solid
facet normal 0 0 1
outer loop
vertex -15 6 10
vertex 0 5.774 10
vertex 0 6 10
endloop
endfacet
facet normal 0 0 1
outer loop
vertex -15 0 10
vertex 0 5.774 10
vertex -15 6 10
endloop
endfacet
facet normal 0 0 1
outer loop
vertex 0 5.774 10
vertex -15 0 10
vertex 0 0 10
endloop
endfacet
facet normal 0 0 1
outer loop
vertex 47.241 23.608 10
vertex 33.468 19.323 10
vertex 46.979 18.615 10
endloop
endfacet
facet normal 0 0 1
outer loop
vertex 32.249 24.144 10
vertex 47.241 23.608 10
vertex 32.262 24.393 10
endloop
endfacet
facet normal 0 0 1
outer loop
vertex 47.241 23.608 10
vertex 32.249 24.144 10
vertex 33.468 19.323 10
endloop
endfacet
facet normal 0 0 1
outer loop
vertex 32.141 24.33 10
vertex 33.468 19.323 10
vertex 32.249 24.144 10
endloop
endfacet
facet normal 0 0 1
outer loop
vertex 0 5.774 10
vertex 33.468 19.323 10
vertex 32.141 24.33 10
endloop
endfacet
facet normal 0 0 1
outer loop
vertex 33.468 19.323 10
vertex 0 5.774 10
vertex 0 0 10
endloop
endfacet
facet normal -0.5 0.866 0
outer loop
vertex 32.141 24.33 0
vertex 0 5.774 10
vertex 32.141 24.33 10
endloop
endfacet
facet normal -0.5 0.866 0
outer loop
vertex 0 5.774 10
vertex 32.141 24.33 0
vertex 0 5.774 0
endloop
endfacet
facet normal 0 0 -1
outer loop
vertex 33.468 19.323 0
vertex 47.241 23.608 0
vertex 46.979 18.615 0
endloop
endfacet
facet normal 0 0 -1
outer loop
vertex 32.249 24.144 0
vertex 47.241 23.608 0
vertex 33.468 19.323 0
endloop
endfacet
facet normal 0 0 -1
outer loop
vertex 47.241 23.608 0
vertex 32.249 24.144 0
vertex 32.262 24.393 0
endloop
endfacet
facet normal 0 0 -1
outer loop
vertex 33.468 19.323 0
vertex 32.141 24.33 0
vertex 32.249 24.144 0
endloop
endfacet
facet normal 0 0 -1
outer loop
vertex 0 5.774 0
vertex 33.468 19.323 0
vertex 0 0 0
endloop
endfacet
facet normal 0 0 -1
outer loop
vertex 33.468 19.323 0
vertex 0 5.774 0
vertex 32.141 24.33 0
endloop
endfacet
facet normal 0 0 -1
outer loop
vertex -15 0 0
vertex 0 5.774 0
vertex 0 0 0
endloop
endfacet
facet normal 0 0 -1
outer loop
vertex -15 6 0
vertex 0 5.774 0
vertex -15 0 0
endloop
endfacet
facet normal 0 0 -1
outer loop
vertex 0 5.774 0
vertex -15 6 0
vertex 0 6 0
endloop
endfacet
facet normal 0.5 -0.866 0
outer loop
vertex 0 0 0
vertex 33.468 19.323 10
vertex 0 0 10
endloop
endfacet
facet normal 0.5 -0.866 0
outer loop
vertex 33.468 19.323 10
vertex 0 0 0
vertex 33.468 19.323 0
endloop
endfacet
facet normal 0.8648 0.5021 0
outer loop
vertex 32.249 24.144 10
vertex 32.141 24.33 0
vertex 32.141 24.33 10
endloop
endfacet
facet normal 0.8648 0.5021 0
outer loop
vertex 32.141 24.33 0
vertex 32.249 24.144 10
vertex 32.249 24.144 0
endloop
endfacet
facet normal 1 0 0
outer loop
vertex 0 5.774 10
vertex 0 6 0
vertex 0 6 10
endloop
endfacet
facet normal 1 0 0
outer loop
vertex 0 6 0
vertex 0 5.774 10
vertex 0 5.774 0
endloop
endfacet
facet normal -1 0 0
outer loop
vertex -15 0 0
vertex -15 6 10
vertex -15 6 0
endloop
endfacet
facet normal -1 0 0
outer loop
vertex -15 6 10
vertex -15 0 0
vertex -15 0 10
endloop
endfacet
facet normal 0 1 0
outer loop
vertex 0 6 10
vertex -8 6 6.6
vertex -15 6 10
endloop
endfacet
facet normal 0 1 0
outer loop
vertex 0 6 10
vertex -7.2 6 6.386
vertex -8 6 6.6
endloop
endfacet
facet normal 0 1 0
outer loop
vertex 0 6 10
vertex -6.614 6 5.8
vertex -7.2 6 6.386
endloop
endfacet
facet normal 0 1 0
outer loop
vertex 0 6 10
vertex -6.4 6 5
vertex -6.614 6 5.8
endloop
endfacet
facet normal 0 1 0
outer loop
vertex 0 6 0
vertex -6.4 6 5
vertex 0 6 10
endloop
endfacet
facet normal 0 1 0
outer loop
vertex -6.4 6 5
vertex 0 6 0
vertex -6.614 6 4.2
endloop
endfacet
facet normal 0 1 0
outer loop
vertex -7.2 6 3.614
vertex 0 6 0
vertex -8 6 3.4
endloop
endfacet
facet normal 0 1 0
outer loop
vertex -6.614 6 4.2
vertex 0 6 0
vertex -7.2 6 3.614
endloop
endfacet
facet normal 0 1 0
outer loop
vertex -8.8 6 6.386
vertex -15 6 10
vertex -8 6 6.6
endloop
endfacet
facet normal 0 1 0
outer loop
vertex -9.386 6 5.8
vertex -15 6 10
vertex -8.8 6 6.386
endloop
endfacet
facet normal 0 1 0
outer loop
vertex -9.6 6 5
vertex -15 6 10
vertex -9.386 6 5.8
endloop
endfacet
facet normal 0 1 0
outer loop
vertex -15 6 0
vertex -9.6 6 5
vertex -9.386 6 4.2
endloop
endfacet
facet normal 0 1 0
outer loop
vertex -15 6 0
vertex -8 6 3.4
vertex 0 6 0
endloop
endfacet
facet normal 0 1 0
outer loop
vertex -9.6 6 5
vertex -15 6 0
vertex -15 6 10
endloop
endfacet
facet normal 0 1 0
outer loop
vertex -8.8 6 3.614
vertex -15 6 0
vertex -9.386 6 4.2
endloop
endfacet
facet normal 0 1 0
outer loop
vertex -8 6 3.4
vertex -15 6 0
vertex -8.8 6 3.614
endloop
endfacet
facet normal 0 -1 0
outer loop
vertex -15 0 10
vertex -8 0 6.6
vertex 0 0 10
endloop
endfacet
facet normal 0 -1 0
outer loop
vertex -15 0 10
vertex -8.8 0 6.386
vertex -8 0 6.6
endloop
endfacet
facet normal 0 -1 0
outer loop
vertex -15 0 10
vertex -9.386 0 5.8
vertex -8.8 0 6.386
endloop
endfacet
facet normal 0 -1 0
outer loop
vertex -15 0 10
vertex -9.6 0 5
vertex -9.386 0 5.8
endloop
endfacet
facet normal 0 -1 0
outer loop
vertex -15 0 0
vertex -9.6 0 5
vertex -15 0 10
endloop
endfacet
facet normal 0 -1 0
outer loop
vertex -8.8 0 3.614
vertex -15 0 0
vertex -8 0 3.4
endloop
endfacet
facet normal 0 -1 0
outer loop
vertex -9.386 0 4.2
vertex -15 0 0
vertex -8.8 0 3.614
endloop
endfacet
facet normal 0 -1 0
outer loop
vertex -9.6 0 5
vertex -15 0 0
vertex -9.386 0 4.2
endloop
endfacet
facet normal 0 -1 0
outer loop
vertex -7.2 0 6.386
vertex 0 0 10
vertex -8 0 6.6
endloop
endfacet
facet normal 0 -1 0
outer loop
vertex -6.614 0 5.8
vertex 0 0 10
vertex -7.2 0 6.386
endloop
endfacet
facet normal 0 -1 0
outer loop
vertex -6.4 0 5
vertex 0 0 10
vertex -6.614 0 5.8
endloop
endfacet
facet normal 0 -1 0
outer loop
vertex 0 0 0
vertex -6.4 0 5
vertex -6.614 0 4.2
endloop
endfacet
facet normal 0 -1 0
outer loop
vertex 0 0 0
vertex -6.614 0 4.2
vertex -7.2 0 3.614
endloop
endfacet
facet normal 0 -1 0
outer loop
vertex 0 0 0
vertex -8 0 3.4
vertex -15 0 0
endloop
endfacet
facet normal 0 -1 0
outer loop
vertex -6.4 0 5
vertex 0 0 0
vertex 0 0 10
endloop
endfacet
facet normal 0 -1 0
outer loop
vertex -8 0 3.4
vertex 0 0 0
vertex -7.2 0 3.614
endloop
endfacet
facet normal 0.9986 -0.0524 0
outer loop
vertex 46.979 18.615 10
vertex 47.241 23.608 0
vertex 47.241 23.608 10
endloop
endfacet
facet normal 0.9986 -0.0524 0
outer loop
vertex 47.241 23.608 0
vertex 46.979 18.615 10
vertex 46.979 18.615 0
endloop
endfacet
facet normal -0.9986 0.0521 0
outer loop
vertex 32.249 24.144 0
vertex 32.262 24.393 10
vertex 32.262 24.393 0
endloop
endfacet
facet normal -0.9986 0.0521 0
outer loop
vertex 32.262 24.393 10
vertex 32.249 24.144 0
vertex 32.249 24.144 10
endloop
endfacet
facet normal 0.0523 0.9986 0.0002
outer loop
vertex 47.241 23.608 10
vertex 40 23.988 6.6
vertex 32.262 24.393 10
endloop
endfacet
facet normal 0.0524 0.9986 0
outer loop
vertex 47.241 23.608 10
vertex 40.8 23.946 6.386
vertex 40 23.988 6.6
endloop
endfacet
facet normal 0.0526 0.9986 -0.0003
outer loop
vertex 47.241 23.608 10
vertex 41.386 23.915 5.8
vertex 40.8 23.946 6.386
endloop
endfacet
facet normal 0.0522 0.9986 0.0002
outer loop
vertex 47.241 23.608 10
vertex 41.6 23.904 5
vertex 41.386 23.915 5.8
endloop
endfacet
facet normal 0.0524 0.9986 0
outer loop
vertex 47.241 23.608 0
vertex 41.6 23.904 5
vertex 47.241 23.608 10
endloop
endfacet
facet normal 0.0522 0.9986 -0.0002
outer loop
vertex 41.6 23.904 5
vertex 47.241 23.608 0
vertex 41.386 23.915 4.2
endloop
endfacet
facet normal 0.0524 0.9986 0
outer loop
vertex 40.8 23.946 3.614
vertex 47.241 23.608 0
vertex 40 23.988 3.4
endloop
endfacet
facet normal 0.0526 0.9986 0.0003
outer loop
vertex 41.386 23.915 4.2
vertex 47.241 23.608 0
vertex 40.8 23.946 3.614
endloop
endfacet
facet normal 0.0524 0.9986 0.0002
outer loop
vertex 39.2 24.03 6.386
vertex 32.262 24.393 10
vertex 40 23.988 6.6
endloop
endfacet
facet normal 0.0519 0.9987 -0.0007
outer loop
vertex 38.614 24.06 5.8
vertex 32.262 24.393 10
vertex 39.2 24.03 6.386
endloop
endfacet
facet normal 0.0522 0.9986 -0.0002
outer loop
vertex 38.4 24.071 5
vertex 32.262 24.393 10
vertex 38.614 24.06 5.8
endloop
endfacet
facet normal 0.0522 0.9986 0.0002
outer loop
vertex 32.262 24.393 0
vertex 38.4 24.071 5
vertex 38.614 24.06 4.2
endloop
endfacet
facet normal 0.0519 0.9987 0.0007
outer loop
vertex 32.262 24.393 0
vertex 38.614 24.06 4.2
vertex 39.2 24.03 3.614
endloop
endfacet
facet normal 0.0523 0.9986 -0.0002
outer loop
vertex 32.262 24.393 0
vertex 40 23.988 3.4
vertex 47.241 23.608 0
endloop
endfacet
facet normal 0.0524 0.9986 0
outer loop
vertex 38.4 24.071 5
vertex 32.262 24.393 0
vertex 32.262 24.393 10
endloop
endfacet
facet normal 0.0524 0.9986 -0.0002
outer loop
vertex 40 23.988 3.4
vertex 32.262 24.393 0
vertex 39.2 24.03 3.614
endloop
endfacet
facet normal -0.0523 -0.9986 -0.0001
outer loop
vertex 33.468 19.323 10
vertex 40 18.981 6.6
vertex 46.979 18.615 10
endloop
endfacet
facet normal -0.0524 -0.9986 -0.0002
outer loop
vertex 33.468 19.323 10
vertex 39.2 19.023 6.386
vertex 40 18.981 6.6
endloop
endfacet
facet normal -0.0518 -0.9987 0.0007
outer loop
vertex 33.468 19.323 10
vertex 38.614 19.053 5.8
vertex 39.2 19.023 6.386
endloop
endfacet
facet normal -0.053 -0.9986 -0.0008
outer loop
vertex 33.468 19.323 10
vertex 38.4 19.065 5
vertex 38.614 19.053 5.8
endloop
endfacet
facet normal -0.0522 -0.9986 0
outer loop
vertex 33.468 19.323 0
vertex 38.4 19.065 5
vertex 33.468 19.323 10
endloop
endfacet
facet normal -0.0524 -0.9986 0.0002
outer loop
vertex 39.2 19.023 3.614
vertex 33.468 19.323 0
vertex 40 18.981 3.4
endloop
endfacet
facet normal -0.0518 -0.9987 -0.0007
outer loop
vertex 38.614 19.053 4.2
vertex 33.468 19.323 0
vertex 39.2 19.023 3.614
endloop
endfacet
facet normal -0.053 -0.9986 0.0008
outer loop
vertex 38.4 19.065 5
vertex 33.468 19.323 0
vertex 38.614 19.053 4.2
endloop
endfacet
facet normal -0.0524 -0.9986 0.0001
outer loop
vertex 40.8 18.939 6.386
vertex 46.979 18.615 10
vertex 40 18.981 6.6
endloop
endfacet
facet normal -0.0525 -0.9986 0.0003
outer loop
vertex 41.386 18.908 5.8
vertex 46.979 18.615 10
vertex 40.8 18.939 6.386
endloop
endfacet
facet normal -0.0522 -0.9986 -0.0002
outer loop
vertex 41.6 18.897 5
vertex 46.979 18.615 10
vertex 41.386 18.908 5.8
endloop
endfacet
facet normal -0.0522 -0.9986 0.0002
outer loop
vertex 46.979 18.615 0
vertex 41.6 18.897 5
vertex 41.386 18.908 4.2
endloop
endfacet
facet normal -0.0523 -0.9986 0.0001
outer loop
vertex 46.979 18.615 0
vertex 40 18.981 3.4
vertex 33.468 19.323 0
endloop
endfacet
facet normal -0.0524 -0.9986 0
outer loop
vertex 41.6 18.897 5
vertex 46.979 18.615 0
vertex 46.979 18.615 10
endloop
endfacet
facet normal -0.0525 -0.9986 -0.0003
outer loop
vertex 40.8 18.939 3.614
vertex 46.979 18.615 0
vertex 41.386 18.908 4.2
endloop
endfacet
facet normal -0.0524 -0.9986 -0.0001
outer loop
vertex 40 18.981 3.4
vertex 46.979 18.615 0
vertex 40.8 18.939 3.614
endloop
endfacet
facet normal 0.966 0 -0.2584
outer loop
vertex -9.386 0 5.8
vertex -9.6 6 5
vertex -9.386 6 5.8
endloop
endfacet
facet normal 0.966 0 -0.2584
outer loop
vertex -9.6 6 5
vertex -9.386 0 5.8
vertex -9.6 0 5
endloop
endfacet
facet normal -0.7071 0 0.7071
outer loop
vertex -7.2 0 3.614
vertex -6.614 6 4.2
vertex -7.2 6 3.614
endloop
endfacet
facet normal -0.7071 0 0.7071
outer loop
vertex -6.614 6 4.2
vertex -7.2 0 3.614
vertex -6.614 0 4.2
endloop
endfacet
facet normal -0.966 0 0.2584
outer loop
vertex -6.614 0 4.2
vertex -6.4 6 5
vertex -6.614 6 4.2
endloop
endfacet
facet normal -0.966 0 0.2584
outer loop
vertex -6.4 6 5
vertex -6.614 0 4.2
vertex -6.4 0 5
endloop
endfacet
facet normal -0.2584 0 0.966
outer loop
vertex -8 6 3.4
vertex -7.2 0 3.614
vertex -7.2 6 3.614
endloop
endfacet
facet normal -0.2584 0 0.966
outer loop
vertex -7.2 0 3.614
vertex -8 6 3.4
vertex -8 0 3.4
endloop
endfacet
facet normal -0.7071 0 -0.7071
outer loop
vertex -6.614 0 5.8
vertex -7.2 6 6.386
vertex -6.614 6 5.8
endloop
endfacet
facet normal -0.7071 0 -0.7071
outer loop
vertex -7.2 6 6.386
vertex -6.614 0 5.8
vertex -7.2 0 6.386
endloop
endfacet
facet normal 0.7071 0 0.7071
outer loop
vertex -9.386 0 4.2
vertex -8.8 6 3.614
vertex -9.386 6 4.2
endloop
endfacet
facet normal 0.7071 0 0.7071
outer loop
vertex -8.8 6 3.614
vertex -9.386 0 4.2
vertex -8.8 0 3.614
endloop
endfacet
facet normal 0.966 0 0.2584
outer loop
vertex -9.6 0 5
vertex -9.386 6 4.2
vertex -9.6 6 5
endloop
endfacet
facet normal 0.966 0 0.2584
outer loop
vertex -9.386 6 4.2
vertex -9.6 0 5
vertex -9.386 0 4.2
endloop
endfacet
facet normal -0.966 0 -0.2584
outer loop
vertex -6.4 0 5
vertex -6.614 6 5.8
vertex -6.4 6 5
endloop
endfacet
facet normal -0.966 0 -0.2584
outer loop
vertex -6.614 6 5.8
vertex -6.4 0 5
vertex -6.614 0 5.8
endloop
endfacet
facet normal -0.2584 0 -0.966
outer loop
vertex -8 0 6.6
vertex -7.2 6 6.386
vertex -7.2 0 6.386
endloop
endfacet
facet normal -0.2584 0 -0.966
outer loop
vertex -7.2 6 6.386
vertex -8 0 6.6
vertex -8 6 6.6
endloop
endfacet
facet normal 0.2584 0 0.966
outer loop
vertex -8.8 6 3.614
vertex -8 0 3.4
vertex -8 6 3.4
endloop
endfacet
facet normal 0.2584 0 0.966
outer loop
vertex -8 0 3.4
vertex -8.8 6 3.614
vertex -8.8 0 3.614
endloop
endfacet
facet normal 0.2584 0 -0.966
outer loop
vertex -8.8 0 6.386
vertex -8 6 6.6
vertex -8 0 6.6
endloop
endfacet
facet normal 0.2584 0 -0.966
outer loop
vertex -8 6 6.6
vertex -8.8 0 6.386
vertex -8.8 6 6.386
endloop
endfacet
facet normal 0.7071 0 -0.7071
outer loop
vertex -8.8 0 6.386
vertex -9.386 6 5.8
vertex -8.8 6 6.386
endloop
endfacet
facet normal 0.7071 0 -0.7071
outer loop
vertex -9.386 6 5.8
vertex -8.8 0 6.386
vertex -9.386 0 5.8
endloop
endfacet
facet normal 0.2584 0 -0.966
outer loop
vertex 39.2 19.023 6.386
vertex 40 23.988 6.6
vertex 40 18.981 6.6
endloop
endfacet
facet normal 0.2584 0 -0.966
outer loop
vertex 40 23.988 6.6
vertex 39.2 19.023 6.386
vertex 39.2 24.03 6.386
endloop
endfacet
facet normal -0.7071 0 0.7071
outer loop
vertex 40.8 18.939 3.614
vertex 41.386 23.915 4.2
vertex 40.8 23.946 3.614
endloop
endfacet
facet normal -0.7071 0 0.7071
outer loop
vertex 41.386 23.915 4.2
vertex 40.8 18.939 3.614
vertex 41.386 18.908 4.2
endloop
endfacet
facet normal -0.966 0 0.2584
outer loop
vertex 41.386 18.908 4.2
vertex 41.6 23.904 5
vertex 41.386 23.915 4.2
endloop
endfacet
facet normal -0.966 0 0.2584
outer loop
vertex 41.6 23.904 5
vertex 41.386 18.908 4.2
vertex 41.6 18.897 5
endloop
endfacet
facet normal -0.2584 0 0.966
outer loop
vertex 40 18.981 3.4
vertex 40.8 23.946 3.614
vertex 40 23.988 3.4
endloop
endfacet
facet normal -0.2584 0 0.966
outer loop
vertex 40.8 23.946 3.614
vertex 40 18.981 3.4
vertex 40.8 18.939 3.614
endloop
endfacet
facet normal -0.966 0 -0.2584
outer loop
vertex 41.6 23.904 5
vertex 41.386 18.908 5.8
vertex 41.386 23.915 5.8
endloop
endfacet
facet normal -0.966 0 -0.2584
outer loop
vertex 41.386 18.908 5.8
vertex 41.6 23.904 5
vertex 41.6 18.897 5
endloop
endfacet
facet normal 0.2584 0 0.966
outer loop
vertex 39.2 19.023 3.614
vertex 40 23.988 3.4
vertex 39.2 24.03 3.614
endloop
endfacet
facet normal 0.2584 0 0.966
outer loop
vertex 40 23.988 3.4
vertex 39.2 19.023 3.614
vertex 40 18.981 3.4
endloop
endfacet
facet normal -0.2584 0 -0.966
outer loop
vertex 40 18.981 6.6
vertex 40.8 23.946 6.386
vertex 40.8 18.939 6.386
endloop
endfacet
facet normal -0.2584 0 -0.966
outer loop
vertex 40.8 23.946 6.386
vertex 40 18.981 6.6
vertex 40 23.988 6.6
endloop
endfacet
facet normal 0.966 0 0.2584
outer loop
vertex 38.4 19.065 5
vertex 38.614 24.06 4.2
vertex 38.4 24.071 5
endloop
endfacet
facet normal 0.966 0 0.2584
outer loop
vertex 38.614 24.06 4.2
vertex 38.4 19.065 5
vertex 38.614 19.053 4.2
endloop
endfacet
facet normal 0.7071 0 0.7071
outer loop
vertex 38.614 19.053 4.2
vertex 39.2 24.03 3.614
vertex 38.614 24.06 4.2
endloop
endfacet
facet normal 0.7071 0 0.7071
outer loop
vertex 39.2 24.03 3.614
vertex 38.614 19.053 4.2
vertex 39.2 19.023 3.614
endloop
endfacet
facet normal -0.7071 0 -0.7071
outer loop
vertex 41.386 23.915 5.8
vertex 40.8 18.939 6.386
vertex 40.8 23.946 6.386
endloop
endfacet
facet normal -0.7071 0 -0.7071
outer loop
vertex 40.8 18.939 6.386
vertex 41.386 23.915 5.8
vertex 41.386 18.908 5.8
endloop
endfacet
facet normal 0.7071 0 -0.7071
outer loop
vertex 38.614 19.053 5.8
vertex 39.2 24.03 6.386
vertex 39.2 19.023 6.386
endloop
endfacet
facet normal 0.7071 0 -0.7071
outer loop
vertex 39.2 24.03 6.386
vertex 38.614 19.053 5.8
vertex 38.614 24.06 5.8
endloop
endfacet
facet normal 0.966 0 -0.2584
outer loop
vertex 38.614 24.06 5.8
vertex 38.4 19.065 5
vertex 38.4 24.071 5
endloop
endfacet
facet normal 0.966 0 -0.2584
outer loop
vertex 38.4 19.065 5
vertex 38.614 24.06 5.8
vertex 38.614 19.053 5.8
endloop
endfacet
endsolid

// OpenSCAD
difference()
{
	union()
	{
		rotate([0,0,30])cube([40,5,10]);
		translate([-15,0,0])cube([15,6,10]);
		translate([32,19.4,0])
		rotate([0,0,-3])cube([15,5,10]);
	}
	translate([-8,-1,5])
	rotate([-90,0,0])cylinder(r=3.2/2,h=12,$fn=12);
	#translate([40,15,5])
	rotate([-90,0,0])cylinder(r=3.2/2,h=12,$fn=12);
}
